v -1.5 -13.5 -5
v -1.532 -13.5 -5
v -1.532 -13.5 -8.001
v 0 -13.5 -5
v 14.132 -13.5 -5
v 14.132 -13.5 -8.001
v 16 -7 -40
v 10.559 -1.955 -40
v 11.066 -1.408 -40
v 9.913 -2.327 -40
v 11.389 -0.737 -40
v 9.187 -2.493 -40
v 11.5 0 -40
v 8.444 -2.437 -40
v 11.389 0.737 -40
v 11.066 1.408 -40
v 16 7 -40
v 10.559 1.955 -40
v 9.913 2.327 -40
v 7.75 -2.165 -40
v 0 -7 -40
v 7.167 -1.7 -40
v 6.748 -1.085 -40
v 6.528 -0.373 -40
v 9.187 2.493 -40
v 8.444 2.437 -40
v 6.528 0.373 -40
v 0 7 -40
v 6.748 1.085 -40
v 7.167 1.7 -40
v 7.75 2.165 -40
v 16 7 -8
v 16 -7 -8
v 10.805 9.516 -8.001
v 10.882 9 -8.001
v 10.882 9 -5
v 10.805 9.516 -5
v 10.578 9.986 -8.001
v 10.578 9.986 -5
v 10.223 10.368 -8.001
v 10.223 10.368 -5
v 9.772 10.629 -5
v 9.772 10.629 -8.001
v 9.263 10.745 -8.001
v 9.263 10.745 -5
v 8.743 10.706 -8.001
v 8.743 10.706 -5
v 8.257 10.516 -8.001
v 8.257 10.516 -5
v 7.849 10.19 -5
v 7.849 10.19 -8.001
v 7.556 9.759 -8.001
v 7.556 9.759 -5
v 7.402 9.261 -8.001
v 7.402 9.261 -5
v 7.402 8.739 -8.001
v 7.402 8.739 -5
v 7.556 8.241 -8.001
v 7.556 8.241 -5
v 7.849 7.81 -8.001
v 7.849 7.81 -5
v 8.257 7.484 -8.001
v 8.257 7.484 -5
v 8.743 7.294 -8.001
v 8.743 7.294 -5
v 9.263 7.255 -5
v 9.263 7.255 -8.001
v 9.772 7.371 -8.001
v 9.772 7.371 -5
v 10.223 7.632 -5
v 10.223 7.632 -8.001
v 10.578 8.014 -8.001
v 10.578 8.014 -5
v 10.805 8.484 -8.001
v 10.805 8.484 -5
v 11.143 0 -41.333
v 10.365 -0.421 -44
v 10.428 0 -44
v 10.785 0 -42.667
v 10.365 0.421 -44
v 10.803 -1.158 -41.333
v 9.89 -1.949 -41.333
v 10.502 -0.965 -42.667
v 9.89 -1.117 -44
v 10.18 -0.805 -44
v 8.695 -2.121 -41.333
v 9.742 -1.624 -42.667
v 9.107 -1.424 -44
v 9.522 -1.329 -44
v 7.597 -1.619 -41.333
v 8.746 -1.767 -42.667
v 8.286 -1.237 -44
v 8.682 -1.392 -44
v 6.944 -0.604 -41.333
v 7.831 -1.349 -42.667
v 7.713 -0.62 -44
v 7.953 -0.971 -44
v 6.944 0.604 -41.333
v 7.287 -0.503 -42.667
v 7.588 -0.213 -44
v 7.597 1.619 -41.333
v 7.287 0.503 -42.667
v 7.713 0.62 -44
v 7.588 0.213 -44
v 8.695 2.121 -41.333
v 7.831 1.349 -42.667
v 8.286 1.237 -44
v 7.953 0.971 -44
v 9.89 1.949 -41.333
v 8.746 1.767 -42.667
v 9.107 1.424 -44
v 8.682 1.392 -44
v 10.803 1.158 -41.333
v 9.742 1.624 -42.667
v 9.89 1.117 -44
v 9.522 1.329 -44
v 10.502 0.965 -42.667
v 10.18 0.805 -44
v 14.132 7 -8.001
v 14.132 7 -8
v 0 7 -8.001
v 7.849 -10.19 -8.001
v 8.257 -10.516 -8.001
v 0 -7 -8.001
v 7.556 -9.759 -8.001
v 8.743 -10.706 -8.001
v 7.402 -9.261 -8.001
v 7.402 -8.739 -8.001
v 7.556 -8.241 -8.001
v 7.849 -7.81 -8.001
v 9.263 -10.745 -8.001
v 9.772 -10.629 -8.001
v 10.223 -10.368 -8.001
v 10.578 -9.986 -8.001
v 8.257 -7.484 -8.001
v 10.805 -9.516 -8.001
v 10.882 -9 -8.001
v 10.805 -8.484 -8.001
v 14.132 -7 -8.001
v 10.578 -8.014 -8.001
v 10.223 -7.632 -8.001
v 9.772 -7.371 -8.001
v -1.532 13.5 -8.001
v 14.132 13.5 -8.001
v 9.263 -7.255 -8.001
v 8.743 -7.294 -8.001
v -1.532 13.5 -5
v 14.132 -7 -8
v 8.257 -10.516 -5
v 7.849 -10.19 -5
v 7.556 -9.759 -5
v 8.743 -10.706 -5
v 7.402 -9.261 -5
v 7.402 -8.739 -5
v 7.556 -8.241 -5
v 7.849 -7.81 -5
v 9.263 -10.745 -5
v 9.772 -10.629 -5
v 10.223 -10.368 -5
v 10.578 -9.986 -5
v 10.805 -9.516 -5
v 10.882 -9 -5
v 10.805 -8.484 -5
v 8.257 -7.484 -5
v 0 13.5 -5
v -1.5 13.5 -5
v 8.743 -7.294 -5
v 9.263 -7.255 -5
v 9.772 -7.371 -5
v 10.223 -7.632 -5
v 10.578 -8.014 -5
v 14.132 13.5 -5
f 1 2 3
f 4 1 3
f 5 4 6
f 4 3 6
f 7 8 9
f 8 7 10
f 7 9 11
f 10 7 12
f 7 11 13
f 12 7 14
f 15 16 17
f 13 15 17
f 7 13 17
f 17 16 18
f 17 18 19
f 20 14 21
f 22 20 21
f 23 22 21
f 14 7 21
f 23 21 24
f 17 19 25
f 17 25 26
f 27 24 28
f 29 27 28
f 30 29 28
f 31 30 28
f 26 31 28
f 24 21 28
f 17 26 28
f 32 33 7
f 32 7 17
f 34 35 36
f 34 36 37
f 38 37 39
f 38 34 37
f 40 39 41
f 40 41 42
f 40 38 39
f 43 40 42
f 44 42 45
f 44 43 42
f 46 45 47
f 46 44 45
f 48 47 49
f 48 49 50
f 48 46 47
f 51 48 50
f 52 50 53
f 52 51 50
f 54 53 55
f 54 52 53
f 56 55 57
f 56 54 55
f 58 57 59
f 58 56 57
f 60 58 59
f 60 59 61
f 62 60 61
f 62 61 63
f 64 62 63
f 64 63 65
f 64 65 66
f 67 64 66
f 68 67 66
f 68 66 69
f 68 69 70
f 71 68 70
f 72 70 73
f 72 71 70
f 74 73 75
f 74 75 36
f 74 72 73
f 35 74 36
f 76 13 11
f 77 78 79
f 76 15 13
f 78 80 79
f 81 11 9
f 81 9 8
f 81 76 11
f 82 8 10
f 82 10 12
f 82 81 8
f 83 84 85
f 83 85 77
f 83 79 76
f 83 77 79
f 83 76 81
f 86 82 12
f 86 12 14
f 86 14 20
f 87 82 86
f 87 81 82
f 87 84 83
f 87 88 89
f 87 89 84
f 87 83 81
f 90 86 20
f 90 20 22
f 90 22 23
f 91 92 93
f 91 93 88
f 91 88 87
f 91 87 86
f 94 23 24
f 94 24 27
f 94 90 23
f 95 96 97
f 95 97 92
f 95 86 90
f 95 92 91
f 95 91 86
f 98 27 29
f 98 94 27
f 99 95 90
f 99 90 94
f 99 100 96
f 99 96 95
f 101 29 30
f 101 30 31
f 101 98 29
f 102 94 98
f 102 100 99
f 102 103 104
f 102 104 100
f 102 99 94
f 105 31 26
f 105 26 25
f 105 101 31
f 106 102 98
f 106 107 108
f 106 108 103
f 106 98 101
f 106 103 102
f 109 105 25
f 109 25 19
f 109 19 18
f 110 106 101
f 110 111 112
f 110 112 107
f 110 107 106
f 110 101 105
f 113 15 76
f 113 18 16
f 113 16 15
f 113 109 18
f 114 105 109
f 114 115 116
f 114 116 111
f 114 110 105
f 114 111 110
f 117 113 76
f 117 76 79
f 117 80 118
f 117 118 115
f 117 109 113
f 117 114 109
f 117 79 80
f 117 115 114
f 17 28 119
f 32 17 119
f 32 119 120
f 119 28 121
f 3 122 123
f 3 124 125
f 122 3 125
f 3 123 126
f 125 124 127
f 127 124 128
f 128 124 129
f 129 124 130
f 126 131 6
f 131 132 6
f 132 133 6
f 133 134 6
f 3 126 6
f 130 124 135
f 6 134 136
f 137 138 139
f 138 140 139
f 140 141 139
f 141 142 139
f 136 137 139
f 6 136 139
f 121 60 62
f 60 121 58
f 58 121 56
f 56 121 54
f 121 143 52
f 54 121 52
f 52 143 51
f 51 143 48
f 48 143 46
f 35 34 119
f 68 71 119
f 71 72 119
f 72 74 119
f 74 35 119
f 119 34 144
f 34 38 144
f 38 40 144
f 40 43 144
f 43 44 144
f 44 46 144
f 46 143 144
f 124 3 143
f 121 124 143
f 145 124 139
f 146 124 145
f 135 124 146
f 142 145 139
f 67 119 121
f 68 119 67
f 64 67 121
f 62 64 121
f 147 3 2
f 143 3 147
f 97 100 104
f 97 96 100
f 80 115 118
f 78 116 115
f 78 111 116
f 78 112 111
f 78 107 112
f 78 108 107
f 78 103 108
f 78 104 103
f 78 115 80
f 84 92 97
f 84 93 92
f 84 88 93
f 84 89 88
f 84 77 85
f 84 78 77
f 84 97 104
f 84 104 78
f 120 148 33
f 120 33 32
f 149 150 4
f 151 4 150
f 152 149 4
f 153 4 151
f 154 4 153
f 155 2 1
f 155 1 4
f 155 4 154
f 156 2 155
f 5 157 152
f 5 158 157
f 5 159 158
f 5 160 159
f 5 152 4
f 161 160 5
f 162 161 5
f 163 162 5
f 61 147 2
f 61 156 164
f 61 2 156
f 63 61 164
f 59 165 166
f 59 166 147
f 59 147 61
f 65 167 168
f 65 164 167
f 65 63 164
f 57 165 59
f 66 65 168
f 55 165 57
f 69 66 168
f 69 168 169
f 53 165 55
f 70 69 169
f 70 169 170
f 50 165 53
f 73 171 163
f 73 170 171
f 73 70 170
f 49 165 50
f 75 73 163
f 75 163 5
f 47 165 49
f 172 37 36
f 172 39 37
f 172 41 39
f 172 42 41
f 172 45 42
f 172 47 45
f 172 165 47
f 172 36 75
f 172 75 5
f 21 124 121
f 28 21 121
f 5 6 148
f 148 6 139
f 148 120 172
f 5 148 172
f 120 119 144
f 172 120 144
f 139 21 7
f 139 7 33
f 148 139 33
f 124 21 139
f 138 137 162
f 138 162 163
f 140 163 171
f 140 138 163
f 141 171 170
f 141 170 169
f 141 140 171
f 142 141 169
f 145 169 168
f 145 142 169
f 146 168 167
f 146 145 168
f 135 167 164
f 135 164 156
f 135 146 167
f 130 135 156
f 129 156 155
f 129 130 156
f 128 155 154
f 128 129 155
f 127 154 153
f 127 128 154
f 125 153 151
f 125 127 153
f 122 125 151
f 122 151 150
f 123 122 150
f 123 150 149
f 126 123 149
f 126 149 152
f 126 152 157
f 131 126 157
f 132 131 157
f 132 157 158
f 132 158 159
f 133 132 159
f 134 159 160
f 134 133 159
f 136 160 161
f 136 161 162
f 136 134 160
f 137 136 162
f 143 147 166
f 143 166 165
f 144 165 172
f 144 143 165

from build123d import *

# Parameters (mm, degrees)
BOSS_EXTRUDE1_DEPTH      = 1.5
SKETCH2_W                = 14
SKETCH2_H                = 32
BOSS_EXTRUDE2_DEPTH      = 16
BOSS_EXTRUDE3_DEPTH      = 3
BOSS_EXTRUDE3_DEPTH_BACK = 0.001
SKETCH3_W                = 15.664729633
SKETCH3_H                = 27
SKETCH3_R                = 1.75
SKETCH5_R                = 2.5
BOSS_EXTRUDE4_DEPTH      = 4
BOSS_EXTRUDE4_TAPER      = 15
CUT_EXTRUDE1_DEPTH       = 10
SKETCH7_W                = 71.065748979
SKETCH7_H                = 70.277880365
CUT_EXTRUDE2_DEPTH       = 30


with BuildPart() as part:
    # Sketch1 → Boss-Extrude1 (new body)
    with BuildSketch(Plane.YZ):
        Polygon((-13.5, 8), (-13.5, -8), (13.5, -8), (13.5, 8), (5, 8), (5, 58), (-5, 58), (-5, 8), align=None)
    extrude(amount=-BOSS_EXTRUDE1_DEPTH)



with BuildPart() as body_2:
    # Sketch2 → Boss-Extrude2 (new body)
    with BuildSketch(Plane.YZ):
        with Locations((0, -24)):
            Rectangle(SKETCH2_W, SKETCH2_H)
    extrude(amount=BOSS_EXTRUDE2_DEPTH)


with BuildPart() as part_1:
    add(part.part)

    add(body_2.part)  # Boss-Extrude3 merges body 2
    # Sketch3 → Boss-Extrude3 (add, two sides: drawn at the far end of the back side and taken through both)
    with BuildSketch(Plane.XY.offset(-8).offset(-BOSS_EXTRUDE3_DEPTH_BACK)):
        with Locations((6.299899253, 0)):
            Rectangle(SKETCH3_W, SKETCH3_H)
        with Locations((9.132264069, 9)):
            Circle(SKETCH3_R, mode=Mode.SUBTRACT)
        with Locations((9.132264069, -9)):
            Circle(SKETCH3_R, mode=Mode.SUBTRACT)
    extrude(amount=BOSS_EXTRUDE3_DEPTH + BOSS_EXTRUDE3_DEPTH_BACK)

    # Sketch5 → Boss-Extrude4 (add)
    with BuildSketch(Plane(origin=(0, 0, -40), x_dir=(1, 0, 0), z_dir=(0, 0, -1))):
        with Locations((9, 0)):
            Circle(SKETCH5_R)
    extrude(amount=BOSS_EXTRUDE4_DEPTH, taper=BOSS_EXTRUDE4_TAPER)

    # Sketch6 → Cut-Extrude1 (cut)
    with BuildSketch(Plane.YZ):
        with BuildLine():
            Line((0.555279177, 48), (0.555279177, 18))
            ThreePointArc((0.555279177, 18), (-1.194720823, 16.25), (-2.944720823, 18))
            Line((-2.944720823, 18), (-2.944720823, 48))
            ThreePointArc((-2.944720823, 48), (-1.194720823, 49.75), (0.555279177, 48))
        make_face()
    extrude(amount=-CUT_EXTRUDE1_DEPTH, mode=Mode.SUBTRACT)

    # Sketch7 → Cut-Extrude2 (cut)
    with BuildSketch(Plane.YZ.offset(14.132264069)):
        with Locations((0.078786861, 30.138940183)):
            Rectangle(SKETCH7_W, SKETCH7_H)
    extrude(amount=-CUT_EXTRUDE2_DEPTH, mode=Mode.SUBTRACT)


solid = part_1.part
